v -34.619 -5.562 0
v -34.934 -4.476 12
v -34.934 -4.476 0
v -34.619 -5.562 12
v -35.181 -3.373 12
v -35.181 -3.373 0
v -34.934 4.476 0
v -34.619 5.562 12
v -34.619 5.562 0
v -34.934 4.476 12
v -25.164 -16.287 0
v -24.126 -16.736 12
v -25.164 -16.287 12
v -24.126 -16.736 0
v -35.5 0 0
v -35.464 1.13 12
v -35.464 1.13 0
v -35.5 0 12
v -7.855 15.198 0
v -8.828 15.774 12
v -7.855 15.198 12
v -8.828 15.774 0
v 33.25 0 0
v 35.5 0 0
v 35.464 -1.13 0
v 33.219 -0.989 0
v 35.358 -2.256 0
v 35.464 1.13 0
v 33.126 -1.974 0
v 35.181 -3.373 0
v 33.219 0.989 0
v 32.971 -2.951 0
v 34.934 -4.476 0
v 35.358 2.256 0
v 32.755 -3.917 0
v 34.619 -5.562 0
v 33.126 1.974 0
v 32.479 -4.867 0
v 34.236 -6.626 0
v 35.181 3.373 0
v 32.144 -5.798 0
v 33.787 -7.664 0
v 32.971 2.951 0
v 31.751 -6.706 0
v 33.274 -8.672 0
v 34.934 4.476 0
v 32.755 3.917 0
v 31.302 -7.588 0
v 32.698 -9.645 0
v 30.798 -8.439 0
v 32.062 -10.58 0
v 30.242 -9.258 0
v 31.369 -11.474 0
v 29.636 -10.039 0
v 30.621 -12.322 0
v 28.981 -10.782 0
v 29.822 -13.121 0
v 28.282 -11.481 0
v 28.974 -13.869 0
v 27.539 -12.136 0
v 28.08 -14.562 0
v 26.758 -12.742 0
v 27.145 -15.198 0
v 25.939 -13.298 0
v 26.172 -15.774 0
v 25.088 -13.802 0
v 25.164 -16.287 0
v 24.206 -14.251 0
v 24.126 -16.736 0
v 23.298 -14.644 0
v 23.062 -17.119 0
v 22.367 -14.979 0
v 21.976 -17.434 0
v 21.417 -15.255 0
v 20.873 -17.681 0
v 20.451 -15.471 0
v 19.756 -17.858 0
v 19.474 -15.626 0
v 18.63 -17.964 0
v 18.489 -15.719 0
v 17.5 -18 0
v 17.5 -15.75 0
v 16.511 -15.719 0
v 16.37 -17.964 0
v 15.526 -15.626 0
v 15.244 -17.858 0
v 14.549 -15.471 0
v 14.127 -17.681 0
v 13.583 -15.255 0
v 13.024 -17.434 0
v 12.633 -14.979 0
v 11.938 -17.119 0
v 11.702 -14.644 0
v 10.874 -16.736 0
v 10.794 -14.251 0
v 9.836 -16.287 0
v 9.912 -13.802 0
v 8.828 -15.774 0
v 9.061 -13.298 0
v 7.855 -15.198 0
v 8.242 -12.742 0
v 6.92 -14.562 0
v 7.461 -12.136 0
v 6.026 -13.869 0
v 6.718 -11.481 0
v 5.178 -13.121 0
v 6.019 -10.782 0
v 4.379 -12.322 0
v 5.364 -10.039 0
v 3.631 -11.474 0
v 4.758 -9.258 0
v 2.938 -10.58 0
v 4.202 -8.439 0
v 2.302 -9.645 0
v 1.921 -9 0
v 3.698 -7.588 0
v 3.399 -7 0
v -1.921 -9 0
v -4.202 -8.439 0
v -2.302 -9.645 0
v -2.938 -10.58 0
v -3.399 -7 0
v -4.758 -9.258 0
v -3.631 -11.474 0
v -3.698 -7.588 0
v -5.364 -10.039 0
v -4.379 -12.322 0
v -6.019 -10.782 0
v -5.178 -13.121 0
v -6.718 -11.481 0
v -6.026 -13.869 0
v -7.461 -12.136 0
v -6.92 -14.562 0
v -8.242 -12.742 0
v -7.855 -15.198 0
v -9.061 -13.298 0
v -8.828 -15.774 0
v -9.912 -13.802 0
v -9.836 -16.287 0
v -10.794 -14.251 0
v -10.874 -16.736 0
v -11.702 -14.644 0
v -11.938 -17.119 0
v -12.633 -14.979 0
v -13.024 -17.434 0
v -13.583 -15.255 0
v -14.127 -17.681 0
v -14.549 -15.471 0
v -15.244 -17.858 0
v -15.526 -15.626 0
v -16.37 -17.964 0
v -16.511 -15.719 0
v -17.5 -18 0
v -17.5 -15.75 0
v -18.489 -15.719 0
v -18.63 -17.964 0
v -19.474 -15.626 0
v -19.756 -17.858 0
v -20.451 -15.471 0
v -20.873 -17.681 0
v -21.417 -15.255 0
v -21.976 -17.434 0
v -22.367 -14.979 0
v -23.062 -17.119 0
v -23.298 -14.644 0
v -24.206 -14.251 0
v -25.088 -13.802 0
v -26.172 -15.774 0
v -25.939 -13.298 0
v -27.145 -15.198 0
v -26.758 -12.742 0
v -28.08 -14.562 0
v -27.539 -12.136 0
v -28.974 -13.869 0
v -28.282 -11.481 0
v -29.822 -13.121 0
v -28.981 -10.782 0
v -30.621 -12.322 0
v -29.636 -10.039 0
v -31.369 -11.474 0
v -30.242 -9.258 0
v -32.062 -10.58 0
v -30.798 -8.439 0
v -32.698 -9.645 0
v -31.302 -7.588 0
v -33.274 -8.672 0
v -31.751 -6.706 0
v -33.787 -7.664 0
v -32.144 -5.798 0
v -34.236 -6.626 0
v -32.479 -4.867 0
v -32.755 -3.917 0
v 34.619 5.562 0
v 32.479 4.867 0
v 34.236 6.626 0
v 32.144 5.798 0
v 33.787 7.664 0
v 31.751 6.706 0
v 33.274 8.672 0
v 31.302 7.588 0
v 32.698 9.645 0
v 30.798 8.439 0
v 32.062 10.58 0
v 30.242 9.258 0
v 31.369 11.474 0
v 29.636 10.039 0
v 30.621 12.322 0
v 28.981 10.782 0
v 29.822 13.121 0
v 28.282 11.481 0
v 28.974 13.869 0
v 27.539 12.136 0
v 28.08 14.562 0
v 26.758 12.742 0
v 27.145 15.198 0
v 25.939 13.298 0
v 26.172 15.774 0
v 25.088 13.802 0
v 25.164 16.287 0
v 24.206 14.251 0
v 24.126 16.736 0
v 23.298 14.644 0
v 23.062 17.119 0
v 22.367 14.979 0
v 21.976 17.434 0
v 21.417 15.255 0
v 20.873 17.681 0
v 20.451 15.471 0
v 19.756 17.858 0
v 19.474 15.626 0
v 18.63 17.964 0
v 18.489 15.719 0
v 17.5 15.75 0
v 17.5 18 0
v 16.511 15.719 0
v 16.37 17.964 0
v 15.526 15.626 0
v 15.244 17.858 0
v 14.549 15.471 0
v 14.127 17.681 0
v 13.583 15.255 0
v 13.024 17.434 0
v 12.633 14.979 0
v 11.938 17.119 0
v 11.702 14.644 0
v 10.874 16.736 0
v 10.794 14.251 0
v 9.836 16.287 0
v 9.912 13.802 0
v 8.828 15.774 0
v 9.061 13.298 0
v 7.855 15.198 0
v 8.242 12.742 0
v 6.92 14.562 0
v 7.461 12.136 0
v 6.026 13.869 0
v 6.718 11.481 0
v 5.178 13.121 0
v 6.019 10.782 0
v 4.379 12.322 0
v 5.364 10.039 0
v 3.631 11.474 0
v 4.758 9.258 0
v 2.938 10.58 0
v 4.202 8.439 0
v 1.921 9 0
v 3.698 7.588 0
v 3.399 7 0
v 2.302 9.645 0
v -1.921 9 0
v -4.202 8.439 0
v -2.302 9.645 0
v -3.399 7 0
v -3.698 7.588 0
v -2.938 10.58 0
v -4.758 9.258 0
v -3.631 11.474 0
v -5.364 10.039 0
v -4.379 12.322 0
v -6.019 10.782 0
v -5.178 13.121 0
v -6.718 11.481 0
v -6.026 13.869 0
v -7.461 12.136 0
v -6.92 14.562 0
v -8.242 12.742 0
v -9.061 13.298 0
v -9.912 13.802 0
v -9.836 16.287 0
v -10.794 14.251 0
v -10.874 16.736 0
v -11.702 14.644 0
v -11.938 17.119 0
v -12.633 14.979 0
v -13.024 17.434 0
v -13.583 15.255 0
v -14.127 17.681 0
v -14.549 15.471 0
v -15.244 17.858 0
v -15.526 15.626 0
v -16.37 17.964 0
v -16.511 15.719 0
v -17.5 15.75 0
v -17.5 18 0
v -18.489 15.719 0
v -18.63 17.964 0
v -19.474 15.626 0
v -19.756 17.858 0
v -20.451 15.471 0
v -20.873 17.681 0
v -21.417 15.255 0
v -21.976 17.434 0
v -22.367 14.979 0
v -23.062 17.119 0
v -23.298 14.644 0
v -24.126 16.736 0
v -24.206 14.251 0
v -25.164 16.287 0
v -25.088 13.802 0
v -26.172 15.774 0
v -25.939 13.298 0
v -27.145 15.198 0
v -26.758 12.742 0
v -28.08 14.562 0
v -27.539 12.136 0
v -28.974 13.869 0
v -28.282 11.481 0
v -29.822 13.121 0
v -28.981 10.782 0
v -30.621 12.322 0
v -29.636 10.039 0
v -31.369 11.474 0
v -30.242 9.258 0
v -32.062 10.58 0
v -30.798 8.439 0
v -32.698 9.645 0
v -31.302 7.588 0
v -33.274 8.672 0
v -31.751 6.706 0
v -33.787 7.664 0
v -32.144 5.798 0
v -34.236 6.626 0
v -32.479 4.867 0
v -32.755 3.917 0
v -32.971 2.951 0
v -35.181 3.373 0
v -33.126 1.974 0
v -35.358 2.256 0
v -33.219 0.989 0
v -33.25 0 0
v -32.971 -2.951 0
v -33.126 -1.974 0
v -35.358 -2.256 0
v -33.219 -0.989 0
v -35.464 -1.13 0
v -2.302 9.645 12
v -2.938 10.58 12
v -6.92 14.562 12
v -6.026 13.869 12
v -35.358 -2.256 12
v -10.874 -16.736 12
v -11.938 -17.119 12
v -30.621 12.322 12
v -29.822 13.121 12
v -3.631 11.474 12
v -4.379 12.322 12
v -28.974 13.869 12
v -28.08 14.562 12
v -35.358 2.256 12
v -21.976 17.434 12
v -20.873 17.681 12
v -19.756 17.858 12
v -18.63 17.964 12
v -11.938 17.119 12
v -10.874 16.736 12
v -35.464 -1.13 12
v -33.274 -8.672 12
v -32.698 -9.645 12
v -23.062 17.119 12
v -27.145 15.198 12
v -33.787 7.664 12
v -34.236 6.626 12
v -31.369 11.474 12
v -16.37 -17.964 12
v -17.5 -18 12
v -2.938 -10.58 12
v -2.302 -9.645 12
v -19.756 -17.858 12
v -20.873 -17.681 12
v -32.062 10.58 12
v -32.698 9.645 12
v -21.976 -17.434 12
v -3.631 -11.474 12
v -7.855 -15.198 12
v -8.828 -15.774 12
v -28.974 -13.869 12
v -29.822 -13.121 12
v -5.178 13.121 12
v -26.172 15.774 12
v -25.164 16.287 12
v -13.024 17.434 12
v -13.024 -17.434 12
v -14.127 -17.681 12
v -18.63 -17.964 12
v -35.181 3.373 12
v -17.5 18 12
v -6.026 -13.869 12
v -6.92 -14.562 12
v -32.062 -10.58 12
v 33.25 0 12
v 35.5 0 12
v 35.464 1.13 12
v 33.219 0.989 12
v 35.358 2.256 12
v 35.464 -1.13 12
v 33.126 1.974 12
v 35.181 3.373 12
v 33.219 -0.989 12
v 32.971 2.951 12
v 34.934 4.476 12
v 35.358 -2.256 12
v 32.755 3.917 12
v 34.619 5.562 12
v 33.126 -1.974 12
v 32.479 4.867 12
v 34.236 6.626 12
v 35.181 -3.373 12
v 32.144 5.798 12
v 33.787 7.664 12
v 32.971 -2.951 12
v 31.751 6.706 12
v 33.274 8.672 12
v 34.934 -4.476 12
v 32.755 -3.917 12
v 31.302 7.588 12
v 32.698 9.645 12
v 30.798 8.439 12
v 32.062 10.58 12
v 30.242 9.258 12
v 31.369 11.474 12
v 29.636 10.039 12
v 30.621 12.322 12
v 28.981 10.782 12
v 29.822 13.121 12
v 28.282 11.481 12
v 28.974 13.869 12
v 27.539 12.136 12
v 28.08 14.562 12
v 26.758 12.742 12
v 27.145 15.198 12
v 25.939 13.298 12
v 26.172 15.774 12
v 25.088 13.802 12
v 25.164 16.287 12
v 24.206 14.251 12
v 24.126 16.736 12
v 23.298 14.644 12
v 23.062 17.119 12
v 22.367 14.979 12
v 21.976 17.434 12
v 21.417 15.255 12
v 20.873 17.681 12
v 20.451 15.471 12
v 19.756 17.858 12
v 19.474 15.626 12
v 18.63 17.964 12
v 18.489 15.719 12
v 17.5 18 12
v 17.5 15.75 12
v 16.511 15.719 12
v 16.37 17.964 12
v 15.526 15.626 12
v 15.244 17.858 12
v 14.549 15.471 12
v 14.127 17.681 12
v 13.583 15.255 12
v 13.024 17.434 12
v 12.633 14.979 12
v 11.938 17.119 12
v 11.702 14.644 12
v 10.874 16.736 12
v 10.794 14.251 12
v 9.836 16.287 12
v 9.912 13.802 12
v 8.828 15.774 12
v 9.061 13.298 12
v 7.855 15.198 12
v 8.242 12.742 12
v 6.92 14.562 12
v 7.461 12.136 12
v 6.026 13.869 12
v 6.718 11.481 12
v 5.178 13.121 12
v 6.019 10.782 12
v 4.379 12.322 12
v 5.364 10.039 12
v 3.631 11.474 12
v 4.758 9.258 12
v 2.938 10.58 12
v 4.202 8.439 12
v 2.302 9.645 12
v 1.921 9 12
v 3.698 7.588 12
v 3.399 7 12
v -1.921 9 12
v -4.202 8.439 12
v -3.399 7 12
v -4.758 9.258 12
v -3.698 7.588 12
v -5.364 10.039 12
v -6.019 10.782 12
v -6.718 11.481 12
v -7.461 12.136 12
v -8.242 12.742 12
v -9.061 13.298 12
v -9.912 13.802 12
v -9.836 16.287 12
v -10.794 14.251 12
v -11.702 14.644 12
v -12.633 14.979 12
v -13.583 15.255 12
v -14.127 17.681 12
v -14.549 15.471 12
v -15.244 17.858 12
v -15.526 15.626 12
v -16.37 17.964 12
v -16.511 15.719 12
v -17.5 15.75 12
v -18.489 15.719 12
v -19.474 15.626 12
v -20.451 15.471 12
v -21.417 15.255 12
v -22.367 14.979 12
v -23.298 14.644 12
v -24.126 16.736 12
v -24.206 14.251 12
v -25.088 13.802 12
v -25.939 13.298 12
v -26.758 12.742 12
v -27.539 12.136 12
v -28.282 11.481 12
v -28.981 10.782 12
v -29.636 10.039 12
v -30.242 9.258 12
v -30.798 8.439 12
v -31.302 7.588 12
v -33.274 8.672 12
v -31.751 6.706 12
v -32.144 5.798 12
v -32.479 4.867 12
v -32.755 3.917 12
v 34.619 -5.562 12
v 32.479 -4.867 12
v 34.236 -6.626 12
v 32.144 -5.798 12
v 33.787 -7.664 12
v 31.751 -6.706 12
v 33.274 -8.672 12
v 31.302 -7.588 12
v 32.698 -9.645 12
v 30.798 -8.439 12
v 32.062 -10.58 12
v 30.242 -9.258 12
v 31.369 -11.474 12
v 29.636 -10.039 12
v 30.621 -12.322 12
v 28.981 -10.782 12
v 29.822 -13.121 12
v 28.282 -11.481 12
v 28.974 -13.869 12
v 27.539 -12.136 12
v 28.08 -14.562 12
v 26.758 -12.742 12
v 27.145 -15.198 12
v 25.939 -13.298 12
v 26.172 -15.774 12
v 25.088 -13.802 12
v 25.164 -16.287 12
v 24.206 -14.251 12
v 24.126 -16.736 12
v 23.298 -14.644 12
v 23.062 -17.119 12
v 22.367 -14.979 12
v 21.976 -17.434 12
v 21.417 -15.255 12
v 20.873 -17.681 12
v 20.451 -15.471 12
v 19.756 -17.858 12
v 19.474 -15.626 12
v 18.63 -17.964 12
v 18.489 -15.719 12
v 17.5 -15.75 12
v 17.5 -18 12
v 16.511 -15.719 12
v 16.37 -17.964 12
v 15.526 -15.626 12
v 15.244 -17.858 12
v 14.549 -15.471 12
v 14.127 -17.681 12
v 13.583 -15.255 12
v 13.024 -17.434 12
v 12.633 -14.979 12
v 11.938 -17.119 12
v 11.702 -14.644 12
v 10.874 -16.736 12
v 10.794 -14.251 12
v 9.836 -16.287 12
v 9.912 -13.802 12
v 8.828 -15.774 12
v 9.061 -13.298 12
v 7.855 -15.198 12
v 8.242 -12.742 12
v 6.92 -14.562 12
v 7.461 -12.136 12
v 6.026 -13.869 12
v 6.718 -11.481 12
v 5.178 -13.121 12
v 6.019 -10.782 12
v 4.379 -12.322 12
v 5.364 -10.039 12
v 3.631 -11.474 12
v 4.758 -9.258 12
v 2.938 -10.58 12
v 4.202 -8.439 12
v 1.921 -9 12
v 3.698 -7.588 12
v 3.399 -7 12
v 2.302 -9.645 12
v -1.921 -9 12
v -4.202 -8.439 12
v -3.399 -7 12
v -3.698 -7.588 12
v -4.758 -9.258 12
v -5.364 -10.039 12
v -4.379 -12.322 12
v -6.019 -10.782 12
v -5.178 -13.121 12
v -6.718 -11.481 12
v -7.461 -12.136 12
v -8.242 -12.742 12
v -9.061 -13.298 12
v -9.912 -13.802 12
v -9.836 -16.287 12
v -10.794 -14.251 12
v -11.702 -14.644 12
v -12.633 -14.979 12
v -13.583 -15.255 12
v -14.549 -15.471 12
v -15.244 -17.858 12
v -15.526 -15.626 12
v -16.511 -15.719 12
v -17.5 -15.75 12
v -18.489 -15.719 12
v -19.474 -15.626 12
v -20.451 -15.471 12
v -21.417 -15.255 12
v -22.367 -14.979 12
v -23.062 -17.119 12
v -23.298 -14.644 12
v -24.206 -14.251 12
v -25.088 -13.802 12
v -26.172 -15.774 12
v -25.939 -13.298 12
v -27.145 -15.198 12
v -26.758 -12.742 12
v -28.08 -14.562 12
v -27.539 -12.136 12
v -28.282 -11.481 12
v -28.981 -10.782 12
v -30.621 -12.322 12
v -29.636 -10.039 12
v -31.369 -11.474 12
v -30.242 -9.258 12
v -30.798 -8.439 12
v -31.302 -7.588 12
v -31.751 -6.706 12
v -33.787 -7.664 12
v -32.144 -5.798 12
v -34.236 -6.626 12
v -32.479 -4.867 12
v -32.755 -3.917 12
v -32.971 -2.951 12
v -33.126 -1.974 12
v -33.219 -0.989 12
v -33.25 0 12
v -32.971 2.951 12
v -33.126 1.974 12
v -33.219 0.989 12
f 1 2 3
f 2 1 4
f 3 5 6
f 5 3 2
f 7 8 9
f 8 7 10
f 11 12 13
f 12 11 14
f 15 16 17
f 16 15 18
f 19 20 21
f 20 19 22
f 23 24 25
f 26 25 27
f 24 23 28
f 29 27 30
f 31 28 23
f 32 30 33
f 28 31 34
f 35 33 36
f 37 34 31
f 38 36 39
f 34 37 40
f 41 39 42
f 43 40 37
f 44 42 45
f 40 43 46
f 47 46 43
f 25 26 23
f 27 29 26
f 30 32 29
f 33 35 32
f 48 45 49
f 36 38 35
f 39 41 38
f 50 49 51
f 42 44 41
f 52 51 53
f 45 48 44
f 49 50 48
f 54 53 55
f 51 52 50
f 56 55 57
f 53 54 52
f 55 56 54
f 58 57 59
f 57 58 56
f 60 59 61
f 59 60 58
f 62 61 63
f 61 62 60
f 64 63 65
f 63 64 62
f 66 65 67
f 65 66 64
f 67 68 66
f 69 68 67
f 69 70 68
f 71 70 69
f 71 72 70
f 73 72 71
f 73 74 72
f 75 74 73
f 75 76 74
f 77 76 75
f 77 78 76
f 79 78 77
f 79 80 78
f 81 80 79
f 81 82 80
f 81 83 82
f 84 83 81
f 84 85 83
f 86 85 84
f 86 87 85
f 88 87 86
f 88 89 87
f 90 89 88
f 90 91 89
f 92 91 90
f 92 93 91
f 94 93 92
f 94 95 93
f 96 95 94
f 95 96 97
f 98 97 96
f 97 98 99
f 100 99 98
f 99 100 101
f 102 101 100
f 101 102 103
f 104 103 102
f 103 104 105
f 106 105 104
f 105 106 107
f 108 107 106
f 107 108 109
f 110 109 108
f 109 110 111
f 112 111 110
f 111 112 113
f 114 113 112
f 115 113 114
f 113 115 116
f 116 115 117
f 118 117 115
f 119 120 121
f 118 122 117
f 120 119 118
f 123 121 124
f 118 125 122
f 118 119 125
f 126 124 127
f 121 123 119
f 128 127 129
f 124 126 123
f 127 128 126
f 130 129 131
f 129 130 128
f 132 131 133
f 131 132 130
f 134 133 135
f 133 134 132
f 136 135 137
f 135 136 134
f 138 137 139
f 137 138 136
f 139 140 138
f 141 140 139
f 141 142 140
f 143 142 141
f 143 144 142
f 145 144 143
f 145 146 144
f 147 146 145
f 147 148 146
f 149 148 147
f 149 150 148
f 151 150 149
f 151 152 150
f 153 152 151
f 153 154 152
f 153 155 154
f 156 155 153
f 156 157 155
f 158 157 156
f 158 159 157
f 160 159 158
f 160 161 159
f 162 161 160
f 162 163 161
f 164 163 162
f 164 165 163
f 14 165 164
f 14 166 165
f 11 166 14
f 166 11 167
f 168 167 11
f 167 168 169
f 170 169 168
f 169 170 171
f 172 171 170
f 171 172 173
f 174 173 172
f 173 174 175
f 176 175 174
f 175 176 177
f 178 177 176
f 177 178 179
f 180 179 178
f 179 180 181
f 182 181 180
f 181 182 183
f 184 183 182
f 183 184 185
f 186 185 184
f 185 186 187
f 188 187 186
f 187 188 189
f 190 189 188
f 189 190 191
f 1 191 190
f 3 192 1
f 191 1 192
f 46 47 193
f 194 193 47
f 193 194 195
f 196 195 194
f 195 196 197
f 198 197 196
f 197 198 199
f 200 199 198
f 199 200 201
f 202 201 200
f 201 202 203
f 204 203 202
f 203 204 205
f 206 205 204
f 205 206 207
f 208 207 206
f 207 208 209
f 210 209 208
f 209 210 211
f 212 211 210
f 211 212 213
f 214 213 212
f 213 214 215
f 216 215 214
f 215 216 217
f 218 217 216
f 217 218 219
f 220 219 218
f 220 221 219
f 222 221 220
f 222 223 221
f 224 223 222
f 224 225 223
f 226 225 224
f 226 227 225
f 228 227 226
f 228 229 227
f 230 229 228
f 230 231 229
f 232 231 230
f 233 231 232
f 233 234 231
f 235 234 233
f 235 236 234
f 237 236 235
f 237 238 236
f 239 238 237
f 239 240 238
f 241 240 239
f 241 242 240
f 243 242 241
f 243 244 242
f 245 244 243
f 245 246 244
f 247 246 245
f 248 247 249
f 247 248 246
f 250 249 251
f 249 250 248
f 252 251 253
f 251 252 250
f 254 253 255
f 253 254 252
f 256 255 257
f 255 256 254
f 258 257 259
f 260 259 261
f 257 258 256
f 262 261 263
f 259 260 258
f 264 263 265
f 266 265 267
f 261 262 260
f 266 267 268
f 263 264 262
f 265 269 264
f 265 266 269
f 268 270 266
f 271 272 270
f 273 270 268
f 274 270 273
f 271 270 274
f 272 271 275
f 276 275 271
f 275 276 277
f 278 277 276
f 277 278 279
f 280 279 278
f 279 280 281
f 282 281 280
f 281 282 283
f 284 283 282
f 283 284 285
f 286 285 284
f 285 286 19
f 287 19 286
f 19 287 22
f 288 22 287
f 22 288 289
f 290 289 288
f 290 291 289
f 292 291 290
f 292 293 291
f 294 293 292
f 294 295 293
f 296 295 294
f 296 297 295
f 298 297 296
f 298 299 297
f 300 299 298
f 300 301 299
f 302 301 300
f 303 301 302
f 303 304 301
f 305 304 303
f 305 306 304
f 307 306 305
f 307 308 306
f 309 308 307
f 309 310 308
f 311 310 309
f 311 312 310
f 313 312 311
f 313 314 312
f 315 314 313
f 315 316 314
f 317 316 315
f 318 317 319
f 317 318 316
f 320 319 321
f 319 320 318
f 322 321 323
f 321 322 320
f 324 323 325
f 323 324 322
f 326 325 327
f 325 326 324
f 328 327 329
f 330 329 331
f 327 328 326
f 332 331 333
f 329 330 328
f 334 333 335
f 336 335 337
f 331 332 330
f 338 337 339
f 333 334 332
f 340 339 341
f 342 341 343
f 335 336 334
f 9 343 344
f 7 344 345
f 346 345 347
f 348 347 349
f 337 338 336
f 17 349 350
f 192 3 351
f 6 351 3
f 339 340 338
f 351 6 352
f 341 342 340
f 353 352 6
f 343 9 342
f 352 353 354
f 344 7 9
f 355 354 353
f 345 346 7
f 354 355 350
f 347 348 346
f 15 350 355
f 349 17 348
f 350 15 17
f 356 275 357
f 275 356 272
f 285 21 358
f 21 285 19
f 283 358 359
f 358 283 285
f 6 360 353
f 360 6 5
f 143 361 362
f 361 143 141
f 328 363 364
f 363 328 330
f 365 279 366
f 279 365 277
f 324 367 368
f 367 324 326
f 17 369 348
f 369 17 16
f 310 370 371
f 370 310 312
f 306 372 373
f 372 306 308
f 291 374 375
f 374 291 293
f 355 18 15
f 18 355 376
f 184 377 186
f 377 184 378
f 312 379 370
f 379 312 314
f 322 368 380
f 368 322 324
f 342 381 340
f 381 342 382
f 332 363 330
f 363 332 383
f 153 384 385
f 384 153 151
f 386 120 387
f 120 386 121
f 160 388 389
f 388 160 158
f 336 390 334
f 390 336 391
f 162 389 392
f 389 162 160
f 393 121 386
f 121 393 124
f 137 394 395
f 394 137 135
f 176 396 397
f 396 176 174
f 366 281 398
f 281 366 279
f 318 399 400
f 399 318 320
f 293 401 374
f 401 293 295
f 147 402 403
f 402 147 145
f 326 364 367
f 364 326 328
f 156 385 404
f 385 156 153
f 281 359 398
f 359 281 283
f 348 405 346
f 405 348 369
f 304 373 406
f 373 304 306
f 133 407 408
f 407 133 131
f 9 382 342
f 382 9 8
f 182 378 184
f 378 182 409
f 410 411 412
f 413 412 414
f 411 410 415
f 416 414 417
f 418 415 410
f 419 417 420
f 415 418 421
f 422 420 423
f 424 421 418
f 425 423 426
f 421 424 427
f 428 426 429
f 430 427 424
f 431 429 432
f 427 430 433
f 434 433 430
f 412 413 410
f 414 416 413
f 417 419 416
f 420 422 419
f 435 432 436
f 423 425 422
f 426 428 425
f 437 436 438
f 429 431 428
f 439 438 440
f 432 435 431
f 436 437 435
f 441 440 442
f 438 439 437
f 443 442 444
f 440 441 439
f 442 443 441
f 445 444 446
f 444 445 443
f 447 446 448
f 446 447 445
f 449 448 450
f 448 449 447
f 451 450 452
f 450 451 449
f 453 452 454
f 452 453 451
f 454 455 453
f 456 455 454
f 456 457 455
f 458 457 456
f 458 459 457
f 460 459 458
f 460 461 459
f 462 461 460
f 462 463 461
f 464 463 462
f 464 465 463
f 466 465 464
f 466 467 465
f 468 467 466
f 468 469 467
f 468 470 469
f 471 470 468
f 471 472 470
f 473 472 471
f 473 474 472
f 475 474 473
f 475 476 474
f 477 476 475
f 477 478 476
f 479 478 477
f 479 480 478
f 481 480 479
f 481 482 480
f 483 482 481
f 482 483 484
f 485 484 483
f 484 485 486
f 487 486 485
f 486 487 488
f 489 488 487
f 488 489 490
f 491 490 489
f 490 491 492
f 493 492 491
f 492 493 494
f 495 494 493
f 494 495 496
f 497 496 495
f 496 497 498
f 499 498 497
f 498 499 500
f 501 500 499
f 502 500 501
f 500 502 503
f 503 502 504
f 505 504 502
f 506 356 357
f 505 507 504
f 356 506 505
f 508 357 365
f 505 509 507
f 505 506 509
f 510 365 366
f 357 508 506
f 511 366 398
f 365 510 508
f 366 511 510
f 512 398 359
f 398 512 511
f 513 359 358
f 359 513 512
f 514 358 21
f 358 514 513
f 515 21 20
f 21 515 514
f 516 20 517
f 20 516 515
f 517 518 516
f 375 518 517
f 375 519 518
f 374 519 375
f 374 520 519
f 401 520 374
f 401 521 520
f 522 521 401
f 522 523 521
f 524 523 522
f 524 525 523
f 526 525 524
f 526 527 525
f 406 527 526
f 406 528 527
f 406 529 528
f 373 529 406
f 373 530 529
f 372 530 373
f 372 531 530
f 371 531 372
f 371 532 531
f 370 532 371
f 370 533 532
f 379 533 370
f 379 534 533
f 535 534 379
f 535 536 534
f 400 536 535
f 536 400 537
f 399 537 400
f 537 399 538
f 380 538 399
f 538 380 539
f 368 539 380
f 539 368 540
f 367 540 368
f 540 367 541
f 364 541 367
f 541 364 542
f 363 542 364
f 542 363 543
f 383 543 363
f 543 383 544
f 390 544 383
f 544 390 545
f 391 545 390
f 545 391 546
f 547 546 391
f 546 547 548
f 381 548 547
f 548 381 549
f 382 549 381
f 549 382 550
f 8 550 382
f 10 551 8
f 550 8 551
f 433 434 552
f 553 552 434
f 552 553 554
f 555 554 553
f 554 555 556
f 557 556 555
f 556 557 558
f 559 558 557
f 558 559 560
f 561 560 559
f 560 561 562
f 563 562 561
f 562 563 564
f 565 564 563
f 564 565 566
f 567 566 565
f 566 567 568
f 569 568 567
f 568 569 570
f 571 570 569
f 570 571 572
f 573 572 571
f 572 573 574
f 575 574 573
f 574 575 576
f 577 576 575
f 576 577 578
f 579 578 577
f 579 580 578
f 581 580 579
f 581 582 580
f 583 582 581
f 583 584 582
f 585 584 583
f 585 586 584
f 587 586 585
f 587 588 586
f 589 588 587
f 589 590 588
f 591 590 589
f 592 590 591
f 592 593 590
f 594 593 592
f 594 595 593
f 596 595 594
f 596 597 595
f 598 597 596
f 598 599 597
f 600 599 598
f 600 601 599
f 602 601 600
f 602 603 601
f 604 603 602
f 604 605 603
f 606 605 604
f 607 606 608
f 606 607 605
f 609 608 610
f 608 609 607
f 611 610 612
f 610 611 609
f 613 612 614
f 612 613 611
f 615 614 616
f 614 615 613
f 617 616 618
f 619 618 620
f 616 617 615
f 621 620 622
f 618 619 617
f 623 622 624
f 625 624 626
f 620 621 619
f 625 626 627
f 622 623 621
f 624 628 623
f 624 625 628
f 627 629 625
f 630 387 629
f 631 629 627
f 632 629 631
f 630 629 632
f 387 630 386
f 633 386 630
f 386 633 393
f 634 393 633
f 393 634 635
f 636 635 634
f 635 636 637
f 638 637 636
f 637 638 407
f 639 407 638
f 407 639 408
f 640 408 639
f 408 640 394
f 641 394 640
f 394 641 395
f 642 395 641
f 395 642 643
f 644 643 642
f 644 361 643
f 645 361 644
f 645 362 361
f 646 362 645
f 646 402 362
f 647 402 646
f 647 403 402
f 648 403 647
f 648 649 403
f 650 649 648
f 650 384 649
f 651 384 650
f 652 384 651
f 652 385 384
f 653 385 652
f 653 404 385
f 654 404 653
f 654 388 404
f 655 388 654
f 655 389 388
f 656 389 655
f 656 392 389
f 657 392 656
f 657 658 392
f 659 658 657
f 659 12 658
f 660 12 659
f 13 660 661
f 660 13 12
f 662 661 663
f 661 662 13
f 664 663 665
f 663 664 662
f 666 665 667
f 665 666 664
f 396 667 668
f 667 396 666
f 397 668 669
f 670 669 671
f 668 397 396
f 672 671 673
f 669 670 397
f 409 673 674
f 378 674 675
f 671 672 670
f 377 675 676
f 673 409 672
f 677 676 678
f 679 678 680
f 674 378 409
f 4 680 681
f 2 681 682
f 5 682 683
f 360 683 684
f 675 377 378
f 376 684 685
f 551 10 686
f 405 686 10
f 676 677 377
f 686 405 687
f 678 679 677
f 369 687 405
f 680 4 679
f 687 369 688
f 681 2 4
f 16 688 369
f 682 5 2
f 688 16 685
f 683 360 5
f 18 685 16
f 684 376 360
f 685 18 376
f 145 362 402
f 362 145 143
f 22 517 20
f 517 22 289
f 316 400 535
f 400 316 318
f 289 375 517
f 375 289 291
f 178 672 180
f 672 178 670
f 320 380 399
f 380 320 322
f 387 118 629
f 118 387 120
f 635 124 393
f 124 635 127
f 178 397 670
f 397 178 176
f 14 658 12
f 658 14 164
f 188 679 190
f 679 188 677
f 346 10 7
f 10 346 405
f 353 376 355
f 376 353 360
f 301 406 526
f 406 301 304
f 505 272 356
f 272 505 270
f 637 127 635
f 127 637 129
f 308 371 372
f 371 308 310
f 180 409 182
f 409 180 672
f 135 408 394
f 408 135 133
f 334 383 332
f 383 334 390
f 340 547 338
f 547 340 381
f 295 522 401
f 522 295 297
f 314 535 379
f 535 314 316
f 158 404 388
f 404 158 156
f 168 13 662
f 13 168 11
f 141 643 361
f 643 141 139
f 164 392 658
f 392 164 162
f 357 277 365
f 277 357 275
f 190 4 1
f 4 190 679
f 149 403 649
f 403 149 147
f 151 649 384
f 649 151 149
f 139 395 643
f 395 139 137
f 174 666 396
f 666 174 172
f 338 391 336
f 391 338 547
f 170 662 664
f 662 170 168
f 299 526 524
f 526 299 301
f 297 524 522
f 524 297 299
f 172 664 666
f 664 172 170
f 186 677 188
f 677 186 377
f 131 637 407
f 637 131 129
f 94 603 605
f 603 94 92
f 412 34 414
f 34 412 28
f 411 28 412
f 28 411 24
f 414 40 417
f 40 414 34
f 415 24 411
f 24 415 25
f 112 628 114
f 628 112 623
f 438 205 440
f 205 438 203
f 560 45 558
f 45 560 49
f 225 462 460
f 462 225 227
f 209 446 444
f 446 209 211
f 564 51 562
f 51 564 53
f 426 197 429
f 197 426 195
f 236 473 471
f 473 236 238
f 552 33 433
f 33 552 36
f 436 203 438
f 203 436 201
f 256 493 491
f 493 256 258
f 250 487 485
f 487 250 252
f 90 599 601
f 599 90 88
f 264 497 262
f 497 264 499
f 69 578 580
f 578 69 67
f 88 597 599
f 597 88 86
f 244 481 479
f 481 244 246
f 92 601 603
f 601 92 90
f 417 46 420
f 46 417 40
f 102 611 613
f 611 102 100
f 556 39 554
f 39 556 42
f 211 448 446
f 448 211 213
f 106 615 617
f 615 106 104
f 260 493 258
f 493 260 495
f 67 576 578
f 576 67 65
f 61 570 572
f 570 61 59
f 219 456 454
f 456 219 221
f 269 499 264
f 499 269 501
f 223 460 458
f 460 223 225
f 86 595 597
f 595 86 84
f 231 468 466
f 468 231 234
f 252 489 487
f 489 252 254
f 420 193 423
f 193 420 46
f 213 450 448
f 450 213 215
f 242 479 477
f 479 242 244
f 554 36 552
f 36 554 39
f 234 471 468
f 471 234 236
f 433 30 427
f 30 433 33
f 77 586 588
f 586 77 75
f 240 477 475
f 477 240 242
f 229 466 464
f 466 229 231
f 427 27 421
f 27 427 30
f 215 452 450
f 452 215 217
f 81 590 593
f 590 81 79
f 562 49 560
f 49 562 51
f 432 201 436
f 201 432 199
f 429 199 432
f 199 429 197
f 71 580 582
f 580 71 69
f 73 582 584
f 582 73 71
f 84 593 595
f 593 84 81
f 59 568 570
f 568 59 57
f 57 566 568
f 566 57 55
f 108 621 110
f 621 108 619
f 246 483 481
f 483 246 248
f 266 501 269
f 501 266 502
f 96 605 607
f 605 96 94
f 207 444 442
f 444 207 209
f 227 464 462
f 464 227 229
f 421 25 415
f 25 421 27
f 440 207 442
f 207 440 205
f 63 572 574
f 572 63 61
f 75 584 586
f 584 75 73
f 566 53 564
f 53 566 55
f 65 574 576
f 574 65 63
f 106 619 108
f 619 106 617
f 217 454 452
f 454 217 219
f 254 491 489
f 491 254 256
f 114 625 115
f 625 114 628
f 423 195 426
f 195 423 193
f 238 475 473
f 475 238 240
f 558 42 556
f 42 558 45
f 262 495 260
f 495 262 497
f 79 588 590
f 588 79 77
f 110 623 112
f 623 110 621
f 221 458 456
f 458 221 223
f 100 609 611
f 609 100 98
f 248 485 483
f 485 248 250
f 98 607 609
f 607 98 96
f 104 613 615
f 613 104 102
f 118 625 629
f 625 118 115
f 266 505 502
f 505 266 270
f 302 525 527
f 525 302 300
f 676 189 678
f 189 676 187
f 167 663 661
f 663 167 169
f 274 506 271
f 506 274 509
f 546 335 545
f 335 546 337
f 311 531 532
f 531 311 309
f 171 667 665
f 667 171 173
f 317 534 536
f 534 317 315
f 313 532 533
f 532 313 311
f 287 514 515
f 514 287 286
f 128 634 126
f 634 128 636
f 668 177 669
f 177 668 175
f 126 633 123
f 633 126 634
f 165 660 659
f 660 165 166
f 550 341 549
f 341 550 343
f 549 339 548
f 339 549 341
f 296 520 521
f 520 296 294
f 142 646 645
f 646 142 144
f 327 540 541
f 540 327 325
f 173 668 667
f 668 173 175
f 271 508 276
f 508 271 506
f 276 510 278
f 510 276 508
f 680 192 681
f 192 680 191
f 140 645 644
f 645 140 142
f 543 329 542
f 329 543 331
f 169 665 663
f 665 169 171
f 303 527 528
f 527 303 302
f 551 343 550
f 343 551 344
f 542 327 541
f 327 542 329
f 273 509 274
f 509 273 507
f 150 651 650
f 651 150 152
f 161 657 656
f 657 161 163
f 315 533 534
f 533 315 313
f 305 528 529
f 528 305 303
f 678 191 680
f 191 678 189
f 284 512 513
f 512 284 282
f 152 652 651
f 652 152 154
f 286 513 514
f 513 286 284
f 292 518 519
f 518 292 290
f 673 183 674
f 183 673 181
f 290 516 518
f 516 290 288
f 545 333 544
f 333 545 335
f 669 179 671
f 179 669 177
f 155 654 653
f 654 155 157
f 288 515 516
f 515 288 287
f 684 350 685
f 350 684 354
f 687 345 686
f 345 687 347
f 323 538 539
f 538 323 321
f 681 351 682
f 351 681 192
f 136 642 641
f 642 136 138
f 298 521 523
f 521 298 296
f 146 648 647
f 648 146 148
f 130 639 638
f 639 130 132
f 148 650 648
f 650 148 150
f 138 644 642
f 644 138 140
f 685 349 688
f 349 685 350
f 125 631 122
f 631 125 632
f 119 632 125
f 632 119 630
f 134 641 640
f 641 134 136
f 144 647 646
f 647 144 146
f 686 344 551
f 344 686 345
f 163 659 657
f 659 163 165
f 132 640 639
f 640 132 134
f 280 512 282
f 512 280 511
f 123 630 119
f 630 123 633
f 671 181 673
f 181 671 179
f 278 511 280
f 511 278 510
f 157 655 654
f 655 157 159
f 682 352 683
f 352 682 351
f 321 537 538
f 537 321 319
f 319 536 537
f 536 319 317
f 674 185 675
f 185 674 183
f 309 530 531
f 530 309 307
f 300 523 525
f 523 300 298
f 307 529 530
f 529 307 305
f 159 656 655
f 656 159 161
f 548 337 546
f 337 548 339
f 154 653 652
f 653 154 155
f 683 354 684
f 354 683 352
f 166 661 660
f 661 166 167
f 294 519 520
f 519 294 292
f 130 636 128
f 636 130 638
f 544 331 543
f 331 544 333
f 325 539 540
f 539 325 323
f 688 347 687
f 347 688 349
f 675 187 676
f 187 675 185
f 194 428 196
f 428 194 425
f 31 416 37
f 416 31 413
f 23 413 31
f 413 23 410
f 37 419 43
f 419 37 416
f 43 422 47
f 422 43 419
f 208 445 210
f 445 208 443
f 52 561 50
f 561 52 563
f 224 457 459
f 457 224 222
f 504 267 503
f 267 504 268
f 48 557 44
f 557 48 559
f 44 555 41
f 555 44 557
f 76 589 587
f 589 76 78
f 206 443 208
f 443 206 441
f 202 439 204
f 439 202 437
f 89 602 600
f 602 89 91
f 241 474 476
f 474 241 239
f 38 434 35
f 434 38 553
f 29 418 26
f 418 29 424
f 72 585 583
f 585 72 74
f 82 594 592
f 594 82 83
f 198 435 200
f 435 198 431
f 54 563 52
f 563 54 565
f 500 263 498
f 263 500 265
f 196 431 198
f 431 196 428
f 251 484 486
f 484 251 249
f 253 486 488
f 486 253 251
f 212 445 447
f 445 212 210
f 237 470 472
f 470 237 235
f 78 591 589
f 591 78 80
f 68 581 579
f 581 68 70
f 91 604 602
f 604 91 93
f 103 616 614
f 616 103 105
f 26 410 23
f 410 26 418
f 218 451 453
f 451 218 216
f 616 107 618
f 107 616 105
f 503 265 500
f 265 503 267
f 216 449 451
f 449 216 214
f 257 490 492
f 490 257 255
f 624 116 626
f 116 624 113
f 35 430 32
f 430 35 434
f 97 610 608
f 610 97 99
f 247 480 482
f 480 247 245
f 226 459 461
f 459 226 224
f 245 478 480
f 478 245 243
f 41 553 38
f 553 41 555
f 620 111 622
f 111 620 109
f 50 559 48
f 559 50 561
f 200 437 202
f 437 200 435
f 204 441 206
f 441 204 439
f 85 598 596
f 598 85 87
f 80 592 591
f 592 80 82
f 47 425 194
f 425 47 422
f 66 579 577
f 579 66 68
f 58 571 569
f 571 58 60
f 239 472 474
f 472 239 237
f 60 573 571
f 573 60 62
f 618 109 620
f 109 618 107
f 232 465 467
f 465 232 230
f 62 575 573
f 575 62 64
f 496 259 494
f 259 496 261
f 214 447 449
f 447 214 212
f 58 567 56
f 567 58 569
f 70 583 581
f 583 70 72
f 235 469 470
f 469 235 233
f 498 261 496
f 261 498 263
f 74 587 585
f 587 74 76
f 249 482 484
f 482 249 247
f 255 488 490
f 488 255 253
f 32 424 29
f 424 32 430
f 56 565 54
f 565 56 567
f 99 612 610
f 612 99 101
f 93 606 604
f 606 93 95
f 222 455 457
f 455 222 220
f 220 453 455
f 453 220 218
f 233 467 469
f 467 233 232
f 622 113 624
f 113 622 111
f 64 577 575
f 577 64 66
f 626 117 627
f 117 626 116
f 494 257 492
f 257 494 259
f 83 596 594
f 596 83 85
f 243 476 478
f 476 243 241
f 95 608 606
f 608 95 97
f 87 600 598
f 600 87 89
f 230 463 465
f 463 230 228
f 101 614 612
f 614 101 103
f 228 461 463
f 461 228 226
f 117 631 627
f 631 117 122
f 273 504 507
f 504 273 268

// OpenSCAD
INNER_DIA = 31.5;
INNER_DIA_CONN = 14;
OUTER_DIA = 36;
OUTER_DIA_CONN = 18;
HEIGHT = 12;
DIST = 35;


$fn = 100;

module rings(dia, inner_dia, height, dist) {
  union() {
    translate([-dist/2, 0, 0])
    cylinder(d = dia, h = height);
    translate([dist/2, 0, 0])
    cylinder(d = dia, h = height);
      
    hull() {
        translate([-dist/2, 0, 0])
        cylinder(d = inner_dia, h = height);
        translate([dist/2, 0, 0])
        cylinder(d = inner_dia, h = height);
    }
  }
}

difference() {
  rings(OUTER_DIA, OUTER_DIA_CONN, HEIGHT, DIST);
  rings(INNER_DIA, INNER_DIA_CONN, HEIGHT, DIST);
}
